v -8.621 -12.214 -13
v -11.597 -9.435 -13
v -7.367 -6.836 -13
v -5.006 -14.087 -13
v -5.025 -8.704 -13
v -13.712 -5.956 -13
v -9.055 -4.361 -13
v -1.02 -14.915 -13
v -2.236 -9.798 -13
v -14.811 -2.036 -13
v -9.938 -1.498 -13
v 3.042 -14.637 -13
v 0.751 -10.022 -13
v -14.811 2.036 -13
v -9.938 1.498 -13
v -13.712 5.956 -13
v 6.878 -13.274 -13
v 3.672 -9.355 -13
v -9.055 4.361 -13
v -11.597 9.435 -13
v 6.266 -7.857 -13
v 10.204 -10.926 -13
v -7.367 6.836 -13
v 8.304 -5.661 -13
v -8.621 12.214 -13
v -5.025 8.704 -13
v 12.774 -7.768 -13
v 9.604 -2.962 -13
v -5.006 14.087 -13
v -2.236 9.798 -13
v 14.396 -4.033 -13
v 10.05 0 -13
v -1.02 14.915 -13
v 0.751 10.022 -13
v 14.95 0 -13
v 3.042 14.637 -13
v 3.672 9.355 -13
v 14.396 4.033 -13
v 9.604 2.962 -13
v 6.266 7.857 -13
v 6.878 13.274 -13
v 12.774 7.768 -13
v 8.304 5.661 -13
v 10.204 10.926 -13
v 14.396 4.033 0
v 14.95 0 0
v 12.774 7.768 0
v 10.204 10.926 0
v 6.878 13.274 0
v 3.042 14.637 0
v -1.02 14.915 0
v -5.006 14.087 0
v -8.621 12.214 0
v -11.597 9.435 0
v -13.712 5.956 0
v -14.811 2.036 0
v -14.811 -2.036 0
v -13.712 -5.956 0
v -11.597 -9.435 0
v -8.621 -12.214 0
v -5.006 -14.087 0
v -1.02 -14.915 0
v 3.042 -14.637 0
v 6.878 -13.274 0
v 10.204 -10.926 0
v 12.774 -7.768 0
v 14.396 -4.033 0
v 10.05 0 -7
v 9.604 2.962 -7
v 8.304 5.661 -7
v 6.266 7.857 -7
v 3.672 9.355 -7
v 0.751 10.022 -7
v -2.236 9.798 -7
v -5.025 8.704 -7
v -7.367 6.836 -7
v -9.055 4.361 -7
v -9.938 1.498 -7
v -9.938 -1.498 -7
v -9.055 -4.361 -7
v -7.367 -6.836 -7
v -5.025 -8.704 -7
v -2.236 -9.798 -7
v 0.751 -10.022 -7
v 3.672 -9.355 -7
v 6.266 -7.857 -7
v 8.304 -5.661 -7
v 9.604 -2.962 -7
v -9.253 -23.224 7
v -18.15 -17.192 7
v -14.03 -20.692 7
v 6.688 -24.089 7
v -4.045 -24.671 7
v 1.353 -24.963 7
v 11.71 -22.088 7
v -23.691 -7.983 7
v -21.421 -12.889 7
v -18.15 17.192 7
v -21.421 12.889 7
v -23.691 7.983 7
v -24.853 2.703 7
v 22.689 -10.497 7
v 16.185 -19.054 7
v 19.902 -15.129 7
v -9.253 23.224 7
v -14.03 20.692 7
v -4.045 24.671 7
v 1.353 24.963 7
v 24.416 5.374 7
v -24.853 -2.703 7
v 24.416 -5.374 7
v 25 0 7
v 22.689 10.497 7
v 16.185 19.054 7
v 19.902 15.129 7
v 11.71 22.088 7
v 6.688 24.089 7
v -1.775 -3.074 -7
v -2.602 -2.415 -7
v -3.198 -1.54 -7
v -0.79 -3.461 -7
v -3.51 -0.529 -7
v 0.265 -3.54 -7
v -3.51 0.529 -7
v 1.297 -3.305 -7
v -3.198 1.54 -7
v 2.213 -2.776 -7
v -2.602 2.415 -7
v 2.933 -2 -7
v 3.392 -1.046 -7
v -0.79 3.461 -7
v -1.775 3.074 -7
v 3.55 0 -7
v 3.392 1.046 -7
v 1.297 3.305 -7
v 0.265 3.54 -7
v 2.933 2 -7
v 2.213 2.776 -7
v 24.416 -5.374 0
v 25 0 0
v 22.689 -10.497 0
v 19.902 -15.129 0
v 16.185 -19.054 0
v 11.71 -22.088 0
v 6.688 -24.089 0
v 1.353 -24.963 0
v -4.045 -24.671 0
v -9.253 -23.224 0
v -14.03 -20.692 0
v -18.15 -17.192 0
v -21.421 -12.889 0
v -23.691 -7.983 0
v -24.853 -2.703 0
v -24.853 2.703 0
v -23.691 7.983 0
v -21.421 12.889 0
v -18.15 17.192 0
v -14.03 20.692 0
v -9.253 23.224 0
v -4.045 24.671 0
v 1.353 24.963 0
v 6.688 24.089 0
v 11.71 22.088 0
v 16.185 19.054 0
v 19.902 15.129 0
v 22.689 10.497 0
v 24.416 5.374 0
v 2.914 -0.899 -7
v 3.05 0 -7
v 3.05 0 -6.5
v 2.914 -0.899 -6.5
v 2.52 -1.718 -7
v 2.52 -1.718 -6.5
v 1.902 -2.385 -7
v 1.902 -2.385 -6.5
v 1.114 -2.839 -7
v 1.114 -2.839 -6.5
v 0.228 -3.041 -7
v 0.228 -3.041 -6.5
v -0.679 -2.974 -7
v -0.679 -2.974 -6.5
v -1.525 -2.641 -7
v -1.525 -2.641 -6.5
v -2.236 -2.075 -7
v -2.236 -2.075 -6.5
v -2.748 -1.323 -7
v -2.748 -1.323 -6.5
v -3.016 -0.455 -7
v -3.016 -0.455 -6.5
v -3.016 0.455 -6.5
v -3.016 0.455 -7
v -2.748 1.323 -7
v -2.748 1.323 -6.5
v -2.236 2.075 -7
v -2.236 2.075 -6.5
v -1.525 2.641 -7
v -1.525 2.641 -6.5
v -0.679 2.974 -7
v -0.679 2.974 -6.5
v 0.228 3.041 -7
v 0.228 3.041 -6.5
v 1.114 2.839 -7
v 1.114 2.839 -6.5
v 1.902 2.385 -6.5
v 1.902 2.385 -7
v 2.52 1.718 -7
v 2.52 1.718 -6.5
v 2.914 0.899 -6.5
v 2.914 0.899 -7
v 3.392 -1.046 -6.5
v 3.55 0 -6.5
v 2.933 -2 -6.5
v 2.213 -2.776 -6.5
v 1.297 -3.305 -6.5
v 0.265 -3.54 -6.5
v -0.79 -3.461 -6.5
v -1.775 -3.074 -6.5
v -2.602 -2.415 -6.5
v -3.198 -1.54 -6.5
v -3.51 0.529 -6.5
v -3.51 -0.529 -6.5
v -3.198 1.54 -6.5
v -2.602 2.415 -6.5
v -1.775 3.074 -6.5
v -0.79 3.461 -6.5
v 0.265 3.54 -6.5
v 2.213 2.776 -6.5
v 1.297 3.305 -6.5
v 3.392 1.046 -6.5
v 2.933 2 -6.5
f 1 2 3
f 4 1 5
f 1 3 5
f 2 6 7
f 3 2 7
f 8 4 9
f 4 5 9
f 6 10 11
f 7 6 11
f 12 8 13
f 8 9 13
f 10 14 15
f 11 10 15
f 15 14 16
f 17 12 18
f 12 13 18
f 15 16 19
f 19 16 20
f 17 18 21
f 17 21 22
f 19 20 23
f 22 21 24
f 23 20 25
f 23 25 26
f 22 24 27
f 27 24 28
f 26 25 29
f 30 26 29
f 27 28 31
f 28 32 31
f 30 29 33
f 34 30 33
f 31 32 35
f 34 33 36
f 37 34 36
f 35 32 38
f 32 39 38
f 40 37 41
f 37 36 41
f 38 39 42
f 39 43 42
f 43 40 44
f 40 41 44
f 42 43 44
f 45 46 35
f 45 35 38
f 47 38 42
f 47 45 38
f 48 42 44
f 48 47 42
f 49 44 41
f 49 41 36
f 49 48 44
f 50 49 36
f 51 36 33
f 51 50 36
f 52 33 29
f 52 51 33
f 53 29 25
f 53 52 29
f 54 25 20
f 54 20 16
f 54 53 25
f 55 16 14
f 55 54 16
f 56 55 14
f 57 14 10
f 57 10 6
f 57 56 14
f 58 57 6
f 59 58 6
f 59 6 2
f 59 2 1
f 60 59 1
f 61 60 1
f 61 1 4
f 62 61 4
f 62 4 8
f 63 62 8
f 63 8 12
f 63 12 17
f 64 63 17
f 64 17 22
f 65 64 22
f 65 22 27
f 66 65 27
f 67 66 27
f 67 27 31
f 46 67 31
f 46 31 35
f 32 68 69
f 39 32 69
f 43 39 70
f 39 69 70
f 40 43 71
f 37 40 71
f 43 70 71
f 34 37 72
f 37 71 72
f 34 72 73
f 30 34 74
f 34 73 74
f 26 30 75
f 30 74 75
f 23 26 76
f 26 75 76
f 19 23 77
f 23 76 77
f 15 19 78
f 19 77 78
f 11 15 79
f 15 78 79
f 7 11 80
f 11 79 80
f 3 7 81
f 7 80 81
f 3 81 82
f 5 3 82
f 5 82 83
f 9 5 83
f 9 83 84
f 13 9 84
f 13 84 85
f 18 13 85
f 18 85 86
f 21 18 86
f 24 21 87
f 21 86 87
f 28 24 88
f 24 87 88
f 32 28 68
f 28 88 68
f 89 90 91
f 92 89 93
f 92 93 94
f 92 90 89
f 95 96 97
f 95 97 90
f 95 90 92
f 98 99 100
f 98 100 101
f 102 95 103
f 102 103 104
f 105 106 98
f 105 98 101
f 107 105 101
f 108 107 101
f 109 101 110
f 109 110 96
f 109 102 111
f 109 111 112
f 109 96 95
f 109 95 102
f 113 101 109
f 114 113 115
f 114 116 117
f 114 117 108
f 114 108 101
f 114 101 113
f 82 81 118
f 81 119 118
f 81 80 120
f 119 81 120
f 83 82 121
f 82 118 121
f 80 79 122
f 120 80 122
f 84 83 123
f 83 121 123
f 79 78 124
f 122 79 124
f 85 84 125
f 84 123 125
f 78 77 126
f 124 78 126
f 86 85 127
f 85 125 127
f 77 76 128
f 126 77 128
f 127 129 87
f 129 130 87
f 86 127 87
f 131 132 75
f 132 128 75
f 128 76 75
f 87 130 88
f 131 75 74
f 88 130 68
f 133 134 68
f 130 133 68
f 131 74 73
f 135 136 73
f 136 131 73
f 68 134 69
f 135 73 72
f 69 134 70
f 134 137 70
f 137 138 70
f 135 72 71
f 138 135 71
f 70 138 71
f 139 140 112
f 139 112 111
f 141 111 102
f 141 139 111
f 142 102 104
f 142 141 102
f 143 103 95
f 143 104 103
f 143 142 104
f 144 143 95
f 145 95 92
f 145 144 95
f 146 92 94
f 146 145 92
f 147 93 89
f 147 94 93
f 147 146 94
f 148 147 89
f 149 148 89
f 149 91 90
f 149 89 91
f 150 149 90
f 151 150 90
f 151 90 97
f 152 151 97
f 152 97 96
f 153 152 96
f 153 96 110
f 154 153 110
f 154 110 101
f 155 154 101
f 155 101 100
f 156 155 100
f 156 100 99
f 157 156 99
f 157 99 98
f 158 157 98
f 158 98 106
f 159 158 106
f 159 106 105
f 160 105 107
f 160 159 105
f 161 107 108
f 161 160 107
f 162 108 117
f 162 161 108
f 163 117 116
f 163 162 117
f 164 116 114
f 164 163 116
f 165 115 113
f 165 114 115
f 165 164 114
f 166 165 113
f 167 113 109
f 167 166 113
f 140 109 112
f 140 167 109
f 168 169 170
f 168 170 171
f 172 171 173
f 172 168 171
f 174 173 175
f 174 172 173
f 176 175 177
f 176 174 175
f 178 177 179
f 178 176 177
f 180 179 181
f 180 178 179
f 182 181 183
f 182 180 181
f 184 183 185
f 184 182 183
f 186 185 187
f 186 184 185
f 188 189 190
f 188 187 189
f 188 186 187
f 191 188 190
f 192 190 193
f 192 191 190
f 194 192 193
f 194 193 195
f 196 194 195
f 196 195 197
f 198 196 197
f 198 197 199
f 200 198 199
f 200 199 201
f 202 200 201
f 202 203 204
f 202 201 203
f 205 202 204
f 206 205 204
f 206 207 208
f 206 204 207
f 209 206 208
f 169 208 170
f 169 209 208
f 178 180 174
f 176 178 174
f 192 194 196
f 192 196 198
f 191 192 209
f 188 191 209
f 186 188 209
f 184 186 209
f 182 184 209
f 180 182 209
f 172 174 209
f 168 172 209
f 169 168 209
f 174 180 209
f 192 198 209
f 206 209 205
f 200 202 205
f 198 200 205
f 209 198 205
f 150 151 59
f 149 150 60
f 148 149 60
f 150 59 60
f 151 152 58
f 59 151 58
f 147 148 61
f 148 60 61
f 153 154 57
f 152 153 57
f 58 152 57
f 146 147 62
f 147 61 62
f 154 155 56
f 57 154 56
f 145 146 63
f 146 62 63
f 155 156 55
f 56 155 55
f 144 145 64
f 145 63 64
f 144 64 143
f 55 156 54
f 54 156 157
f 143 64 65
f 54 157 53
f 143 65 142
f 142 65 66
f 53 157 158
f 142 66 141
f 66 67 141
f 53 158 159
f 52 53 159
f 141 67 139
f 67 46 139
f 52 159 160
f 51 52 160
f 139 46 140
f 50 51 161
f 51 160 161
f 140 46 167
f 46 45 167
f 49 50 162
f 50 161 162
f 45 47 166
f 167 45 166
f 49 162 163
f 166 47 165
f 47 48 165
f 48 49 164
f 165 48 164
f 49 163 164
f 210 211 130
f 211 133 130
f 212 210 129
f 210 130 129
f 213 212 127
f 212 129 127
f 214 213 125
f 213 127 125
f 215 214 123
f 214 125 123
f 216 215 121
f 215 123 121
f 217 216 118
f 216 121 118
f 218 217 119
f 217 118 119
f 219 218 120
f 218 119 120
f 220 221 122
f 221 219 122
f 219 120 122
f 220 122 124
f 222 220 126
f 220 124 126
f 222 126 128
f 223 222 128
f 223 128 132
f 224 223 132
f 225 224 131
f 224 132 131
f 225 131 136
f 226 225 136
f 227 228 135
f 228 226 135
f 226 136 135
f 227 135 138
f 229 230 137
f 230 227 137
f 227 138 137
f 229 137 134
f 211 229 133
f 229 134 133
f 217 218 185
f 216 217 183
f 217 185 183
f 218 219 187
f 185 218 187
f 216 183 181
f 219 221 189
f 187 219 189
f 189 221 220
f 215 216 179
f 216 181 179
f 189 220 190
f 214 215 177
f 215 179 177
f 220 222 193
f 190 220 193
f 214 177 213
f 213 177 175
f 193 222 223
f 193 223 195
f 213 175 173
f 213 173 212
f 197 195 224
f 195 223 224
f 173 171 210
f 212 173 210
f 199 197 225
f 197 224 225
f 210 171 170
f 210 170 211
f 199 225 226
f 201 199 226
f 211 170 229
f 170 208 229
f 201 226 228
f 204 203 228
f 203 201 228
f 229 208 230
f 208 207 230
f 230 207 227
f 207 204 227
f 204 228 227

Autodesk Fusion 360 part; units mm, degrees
sketch "Sketch1" plane through (0, 0, 0) normal (0, 0, 1) x (1, 0, 0)
  circle A0 centre (0, 0) radius 14.95
  circle A1 centre (0, 0) radius 10.05
  circle A2 centre (0, 0) radius 3.05
  circle A3 centre (0, 0) radius 3.55
  circle A4 centre (0, 0) radius 25
  dimension "d1" = 29.9
  dimension "d2" = 20.1
  dimension "d7" = 6.1
  dimension "d8" = 7.1
  dimension "d9" = 50
extrude "Extrude1" add sketch "Sketch1" against normal blind 13 contours A0
extrude "Extrude2" add sketch "Sketch1" against normal blind 7 contours A1 | A2 | A3
extrude "Extrude3" add sketch "Sketch1" against normal blind 8 contours A3
extrude "Extrude4" cut 1 faces at (3.3701, -0.1764, -8) along direction (0, 0, 1) blind 1.5
extrude "Extrude5" add sketch "Sketch1" along normal blind 7 contours A0 | A1 | A2 | A3 | A4
